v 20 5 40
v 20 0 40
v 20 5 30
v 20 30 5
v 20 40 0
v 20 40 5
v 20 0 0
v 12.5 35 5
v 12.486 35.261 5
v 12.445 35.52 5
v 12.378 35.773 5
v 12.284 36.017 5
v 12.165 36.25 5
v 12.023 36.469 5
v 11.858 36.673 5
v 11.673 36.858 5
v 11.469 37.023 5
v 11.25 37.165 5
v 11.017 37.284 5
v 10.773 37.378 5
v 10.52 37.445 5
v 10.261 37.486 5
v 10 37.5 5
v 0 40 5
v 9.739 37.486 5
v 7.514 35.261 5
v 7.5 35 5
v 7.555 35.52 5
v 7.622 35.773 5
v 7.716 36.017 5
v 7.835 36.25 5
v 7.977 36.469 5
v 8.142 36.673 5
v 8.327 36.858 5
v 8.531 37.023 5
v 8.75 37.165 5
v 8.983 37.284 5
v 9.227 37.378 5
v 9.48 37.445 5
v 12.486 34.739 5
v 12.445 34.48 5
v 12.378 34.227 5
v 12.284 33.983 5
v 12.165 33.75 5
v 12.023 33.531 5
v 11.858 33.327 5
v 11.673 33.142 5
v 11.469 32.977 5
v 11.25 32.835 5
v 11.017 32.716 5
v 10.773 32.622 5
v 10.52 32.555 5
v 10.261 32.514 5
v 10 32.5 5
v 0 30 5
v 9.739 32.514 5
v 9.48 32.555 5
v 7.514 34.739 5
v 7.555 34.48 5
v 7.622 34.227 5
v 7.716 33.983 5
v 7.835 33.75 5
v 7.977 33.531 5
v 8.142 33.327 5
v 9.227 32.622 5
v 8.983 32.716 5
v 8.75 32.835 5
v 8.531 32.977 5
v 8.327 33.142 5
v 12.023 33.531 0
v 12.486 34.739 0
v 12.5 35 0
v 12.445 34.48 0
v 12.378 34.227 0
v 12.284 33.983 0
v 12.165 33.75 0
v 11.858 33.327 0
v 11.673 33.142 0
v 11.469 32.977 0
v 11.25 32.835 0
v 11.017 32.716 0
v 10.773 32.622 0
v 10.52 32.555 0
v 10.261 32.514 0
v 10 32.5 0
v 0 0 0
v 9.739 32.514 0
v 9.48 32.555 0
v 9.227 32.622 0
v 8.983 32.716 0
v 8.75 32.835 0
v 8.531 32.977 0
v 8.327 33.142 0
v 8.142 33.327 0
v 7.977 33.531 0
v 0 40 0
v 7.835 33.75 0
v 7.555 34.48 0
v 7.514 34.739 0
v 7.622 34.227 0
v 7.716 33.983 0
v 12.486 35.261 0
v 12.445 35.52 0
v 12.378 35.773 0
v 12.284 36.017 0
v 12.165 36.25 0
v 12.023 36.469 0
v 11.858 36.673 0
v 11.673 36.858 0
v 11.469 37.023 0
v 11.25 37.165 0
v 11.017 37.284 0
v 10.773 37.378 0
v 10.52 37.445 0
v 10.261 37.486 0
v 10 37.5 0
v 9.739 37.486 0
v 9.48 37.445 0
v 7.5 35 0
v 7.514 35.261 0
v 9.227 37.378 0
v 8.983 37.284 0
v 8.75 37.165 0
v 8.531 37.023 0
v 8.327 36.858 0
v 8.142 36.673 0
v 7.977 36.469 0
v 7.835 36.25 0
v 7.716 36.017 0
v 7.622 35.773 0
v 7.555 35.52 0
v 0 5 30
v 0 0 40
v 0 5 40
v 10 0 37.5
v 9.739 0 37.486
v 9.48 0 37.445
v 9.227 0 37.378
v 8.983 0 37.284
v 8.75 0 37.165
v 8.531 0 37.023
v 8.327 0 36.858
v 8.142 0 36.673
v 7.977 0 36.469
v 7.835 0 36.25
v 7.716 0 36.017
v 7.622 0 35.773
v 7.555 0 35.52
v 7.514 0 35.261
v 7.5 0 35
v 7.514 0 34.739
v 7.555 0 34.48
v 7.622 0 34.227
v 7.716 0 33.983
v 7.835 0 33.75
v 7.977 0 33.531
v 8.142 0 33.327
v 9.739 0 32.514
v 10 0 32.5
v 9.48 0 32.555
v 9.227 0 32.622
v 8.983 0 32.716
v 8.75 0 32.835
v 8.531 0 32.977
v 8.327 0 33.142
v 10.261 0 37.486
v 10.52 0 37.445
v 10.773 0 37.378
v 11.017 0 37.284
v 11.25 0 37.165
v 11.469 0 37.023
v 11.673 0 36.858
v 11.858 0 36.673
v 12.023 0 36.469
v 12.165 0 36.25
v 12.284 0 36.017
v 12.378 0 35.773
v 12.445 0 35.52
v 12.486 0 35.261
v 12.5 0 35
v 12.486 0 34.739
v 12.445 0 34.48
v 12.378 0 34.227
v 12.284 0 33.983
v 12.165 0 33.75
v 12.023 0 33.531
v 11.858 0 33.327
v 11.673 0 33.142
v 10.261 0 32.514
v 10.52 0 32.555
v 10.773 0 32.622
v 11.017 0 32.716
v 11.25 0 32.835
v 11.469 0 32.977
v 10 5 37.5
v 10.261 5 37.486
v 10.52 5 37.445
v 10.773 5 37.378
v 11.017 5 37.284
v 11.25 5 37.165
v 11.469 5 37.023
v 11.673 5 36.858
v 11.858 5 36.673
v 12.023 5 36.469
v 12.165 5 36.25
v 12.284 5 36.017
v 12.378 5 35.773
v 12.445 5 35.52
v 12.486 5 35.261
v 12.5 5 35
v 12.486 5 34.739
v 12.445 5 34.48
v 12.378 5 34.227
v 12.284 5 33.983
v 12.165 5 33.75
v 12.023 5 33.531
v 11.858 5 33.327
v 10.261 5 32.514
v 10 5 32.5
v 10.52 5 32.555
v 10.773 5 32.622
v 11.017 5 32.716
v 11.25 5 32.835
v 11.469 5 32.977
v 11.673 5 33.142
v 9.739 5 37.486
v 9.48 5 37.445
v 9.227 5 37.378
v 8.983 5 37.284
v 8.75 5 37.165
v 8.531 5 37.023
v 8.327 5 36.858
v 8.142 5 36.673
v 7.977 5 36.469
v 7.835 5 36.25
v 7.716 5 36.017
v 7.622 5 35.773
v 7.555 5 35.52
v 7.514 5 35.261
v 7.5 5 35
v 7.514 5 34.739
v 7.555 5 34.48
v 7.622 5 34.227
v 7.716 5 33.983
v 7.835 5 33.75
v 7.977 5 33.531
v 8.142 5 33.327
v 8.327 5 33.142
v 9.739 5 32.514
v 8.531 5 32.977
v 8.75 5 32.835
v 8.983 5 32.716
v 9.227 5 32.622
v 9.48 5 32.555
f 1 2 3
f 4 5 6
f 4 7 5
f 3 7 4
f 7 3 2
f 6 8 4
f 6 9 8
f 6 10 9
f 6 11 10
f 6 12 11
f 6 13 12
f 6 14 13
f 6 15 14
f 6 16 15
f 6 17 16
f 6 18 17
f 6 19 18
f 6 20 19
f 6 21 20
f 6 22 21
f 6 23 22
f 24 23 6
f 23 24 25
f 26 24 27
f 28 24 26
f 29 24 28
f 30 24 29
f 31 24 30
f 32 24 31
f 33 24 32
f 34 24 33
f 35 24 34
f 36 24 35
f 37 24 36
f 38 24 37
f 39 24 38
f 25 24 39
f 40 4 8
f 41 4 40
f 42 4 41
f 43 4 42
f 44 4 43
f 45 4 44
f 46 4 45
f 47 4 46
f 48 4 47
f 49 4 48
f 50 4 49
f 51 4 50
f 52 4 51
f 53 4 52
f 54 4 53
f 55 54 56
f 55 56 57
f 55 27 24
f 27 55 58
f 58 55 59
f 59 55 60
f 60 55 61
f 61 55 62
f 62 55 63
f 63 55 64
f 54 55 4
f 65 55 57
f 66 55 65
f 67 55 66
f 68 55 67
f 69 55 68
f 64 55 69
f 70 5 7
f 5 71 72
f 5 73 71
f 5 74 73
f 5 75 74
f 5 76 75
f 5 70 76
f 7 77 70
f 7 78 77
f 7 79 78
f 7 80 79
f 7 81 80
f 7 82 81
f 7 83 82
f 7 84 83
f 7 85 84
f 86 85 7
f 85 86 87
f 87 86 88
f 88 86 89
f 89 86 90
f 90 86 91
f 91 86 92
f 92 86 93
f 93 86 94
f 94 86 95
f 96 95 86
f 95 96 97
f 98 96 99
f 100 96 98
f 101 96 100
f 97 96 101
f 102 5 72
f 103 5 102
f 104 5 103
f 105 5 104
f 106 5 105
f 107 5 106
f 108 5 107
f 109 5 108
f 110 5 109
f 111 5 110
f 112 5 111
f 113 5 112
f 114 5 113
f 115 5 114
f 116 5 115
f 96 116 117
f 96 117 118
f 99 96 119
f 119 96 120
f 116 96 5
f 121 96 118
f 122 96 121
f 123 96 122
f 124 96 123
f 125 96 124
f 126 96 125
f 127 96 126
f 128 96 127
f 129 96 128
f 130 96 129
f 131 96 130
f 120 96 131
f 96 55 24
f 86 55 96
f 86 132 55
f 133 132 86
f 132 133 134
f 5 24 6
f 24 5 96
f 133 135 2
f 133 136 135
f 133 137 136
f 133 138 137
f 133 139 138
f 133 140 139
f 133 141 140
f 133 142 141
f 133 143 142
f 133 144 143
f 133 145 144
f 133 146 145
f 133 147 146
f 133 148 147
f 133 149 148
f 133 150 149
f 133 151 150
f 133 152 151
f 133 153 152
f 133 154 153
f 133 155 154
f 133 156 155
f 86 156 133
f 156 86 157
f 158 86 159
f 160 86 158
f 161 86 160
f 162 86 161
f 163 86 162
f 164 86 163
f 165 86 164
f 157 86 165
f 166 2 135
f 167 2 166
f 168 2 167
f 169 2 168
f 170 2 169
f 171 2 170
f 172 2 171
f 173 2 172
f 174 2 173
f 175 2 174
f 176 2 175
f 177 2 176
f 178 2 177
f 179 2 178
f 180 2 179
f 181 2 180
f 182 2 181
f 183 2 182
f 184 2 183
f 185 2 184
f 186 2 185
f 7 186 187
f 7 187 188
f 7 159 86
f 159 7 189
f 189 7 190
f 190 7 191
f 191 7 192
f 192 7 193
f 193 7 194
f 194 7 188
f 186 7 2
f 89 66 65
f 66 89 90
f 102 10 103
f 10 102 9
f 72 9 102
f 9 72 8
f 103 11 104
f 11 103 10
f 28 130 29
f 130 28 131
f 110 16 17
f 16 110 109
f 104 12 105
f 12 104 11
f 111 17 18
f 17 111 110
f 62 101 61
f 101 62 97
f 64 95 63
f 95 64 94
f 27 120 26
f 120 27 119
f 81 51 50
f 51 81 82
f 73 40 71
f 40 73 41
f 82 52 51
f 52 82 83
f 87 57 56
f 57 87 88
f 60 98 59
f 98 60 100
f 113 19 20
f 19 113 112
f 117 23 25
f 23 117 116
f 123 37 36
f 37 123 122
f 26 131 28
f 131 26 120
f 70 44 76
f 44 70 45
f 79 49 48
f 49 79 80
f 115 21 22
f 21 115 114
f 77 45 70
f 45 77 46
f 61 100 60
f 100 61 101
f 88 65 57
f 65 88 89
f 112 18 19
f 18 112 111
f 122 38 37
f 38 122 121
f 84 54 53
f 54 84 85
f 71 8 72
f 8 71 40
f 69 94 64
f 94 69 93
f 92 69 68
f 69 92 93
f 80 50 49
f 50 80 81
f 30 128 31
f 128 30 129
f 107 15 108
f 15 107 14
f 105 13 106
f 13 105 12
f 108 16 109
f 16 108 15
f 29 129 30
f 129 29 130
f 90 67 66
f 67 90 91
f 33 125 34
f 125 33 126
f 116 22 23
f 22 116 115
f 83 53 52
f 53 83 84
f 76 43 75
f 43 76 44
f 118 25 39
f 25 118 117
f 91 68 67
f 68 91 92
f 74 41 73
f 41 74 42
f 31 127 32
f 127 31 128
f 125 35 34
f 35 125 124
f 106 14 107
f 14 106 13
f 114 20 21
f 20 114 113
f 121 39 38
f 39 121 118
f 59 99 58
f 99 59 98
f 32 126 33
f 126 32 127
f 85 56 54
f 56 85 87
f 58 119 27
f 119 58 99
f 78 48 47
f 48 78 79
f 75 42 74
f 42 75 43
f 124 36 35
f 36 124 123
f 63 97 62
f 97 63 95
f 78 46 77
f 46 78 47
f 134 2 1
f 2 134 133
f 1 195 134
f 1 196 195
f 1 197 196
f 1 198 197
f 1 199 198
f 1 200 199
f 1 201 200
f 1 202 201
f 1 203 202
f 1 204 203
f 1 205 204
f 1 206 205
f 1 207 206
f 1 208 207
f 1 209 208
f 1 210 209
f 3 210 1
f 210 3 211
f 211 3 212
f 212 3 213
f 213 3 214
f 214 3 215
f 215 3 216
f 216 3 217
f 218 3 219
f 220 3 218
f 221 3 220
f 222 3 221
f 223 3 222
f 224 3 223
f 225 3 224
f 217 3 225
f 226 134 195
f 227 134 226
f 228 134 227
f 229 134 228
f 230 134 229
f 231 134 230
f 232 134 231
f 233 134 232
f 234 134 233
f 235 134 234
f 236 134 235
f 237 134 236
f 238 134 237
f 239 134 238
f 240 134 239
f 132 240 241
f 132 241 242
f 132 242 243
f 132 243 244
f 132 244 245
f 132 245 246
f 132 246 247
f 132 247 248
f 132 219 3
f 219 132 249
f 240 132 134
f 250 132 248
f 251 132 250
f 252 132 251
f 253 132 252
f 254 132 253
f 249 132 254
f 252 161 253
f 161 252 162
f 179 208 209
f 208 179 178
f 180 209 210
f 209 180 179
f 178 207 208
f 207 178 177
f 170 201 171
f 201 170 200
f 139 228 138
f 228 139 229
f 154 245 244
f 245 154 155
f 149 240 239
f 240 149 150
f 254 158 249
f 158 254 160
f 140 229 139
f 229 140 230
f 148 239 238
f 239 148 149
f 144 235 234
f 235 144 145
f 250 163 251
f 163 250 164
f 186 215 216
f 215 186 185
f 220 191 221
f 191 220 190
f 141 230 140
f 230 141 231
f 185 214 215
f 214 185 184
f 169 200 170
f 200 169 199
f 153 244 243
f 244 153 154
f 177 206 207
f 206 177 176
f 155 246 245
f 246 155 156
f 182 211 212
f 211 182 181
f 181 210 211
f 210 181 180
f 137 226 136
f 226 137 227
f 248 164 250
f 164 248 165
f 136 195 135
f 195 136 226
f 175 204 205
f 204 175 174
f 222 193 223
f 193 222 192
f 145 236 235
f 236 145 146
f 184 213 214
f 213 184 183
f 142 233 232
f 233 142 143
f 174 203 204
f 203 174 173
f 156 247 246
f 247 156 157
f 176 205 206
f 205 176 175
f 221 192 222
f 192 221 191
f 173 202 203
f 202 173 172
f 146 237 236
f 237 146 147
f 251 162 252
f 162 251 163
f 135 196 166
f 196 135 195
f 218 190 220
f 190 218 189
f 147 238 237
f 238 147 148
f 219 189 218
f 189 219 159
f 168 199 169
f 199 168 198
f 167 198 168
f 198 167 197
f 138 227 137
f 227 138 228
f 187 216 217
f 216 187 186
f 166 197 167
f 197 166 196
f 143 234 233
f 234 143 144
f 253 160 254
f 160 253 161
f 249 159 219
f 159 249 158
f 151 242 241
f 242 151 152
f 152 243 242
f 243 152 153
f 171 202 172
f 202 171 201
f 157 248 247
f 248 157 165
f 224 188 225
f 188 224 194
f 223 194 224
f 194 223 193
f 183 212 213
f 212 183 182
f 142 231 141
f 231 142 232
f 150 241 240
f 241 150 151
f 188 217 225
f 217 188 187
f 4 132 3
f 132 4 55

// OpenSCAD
$fn=60;

difference() {
    cube([20,40,5]);
    translate([10,35,0]) cylinder(d=5,h=10);
}
difference() {
    cube([20,5,40]);
    translate([10,10,35]) rotate([90,0,0]) cylinder(d=5,h=10);
}
hull() {
    cube([20,30,5]);
    cube([20,5,30]);
}
